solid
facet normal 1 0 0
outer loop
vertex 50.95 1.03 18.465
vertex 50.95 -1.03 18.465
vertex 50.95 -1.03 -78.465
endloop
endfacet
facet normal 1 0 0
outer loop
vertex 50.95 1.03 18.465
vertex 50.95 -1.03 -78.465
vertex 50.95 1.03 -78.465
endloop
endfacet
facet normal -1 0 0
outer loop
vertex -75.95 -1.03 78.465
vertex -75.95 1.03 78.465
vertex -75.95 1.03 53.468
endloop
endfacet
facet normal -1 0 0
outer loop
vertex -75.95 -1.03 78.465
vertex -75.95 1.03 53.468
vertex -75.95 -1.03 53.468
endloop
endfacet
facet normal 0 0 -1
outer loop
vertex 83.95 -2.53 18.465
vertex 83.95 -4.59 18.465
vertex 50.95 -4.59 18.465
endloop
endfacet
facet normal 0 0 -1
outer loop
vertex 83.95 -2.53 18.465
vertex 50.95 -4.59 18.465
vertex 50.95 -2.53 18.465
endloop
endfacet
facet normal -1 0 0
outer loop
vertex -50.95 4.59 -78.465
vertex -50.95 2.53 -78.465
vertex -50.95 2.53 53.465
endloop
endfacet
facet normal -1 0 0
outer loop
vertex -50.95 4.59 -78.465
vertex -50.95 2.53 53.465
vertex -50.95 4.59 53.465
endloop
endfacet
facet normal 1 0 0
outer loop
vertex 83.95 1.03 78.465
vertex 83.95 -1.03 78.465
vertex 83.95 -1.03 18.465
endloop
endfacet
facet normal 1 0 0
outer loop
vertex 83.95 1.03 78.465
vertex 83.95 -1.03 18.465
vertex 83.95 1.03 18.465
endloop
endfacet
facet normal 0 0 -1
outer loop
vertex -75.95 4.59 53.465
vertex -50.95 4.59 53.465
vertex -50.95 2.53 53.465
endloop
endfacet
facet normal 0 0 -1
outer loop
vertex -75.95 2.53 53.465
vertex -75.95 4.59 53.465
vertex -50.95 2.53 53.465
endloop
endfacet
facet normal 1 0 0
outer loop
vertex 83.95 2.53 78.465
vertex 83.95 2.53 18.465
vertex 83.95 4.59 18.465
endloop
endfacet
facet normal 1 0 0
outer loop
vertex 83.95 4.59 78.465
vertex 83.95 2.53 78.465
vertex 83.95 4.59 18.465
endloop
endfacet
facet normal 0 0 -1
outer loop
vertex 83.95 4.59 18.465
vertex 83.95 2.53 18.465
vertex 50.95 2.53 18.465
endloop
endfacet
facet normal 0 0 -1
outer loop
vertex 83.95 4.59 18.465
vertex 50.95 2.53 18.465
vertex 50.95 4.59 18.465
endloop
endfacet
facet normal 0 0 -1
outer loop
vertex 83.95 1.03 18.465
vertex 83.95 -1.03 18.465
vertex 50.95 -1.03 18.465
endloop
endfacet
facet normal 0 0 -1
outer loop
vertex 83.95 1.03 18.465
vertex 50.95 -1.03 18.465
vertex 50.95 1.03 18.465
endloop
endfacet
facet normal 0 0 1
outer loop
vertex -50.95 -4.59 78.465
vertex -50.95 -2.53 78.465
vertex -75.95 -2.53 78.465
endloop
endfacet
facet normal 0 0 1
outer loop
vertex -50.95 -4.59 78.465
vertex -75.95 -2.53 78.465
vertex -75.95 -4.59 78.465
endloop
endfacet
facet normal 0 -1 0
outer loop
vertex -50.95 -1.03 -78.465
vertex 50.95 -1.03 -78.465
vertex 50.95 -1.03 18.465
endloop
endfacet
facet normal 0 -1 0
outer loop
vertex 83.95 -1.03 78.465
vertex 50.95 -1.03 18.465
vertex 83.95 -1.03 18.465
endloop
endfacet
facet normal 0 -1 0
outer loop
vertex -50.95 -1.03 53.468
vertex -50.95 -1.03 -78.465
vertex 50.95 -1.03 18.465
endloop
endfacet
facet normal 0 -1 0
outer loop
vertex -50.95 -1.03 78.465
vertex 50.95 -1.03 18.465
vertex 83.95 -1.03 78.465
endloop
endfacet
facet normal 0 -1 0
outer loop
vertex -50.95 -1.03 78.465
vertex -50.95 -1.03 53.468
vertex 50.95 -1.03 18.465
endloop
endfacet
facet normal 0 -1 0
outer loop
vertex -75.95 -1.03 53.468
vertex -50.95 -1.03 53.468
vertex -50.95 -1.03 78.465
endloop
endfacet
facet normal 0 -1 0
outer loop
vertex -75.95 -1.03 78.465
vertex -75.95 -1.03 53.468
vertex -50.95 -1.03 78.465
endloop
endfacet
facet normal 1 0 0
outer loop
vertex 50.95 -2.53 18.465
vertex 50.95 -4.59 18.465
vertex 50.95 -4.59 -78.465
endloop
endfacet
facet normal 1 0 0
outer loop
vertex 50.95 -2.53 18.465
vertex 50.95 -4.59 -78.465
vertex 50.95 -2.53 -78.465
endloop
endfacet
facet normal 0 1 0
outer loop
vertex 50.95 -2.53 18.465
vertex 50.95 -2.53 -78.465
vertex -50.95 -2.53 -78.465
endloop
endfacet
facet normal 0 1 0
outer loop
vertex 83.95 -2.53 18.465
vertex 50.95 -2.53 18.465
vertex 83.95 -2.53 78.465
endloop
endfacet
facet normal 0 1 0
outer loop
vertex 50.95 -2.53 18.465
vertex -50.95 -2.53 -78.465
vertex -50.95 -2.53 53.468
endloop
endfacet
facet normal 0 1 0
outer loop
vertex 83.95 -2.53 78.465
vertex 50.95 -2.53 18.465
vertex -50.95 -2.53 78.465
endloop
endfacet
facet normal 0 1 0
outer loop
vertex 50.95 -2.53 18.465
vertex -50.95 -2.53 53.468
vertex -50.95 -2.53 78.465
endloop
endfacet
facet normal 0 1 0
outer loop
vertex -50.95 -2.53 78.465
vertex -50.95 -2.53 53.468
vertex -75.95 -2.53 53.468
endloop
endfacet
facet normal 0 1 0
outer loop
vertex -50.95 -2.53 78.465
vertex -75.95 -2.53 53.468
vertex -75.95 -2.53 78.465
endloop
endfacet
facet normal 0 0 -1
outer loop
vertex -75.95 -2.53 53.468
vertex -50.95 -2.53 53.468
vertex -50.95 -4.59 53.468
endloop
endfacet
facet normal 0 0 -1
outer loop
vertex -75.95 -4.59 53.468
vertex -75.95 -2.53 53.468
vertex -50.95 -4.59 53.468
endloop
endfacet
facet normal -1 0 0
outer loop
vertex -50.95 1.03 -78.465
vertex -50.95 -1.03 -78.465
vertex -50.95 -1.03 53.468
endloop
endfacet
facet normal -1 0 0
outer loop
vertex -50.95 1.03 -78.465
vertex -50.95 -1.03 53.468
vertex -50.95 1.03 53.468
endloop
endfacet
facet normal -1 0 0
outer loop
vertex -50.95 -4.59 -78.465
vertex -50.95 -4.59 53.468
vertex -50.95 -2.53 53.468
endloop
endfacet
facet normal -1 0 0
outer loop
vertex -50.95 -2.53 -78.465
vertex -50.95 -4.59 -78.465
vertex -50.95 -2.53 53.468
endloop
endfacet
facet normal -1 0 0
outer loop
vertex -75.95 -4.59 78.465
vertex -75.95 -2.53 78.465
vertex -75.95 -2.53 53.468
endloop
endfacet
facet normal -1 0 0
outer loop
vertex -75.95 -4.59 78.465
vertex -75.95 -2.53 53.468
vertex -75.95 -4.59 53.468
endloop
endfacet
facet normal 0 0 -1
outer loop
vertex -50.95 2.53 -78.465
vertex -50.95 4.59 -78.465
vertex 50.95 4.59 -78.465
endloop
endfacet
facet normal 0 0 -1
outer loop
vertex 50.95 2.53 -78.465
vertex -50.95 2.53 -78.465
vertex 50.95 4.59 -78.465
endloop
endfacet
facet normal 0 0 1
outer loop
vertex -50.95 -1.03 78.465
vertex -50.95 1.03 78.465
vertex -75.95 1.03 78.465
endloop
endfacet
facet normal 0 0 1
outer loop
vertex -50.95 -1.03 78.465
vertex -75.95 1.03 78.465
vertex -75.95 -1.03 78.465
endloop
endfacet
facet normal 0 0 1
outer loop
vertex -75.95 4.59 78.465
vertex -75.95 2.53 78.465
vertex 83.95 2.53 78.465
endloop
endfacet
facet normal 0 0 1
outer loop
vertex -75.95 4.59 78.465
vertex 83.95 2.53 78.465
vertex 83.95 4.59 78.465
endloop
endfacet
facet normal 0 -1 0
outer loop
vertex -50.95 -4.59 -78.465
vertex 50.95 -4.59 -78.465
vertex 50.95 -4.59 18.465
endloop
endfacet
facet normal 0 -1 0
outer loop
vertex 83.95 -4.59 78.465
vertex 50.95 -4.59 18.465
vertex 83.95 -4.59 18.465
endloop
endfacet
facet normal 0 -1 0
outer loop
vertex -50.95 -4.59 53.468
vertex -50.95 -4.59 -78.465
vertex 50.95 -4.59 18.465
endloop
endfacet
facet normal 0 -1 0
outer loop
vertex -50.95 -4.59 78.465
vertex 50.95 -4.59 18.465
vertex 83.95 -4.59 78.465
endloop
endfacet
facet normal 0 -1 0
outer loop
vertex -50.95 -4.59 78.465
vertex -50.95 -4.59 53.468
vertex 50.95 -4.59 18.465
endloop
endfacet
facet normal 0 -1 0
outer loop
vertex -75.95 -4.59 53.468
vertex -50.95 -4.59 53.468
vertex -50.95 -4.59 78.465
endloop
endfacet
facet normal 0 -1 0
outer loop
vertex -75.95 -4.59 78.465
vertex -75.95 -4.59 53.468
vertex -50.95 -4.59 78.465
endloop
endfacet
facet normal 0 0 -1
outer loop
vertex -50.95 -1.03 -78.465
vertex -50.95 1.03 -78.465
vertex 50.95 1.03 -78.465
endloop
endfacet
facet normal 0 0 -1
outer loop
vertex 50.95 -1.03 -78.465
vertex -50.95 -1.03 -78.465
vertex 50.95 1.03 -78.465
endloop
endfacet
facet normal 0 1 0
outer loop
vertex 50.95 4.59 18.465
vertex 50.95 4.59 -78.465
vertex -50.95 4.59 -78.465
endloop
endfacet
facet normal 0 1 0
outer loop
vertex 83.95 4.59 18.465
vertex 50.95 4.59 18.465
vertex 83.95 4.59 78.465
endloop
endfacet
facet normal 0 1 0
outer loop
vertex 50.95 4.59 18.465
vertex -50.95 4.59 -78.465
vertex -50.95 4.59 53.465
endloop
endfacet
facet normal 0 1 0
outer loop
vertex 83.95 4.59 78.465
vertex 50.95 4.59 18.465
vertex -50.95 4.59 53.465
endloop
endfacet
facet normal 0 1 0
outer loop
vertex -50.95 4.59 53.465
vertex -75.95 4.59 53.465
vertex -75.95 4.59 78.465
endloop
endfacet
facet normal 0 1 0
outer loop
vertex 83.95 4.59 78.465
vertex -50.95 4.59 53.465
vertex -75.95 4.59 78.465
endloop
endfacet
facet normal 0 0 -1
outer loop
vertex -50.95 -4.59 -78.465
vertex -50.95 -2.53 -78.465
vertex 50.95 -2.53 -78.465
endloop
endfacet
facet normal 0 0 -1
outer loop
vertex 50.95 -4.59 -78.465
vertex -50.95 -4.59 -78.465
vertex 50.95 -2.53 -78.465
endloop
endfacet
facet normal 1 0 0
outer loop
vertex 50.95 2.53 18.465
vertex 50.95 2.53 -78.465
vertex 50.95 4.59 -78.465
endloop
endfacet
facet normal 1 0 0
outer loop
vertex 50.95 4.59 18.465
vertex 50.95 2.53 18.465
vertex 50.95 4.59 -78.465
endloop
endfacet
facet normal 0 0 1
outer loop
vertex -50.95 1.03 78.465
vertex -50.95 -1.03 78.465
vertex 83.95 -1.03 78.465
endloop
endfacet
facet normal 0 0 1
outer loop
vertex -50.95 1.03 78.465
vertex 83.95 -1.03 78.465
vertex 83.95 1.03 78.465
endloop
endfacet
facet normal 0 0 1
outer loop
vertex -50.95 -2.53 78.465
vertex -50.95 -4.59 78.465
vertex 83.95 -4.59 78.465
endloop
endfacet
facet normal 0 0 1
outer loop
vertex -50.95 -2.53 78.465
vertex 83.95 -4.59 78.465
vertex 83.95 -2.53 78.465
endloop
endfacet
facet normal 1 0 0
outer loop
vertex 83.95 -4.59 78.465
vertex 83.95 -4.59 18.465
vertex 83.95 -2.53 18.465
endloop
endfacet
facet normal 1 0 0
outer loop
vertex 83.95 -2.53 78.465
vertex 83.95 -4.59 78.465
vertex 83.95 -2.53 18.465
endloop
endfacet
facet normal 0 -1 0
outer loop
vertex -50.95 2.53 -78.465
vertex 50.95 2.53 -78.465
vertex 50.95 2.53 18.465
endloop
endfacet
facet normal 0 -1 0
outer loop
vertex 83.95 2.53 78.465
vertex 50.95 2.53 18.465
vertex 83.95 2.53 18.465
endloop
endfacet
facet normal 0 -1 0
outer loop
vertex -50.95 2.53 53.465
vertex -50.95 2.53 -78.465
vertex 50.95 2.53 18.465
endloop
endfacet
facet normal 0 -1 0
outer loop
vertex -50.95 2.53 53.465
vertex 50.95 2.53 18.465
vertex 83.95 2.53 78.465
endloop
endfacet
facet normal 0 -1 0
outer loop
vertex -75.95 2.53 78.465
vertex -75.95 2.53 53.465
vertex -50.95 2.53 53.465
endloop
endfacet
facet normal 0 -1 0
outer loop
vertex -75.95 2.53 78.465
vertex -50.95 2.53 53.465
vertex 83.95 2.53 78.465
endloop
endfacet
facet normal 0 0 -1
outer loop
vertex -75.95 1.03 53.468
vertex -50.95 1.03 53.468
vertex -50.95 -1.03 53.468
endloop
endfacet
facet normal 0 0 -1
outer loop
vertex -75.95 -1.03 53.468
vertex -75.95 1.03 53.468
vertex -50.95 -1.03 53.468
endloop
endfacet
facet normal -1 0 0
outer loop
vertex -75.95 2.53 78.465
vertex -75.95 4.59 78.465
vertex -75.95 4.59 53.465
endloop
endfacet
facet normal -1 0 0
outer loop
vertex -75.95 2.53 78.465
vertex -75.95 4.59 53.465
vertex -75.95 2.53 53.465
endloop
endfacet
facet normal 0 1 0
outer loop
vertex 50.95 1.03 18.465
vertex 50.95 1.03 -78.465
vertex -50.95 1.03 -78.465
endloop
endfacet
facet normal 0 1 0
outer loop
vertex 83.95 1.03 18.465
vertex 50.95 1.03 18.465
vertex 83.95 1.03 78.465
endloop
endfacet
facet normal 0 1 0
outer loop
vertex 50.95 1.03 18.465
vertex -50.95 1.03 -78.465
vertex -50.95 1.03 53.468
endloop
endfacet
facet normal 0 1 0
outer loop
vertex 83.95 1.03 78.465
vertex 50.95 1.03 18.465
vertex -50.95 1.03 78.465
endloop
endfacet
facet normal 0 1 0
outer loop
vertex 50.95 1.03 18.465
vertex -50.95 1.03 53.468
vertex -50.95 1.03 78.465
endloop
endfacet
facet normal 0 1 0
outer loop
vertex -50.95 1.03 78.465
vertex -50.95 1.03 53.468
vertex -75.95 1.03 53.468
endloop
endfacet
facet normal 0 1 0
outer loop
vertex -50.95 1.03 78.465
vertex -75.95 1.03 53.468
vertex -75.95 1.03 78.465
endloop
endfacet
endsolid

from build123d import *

# Parameters (mm, degrees)
F0_W     = 101.9
F0_H     = 2.06
F1_DEPTH = 78.465
F2_W     = 2.06
F2_H     = 25
F3_W     = 2.06
F3_H     = 24.996869
F4_W     = 2.06
F4_H     = 24.996869
F5_DEPTH = 25
F6_W     = 2.06
F6_H     = 60
F7_W     = 2.06
F7_H     = 60
F8_W     = 2.06
F8_H     = 60
F9_DEPTH = 33


with BuildPart() as f1:
    # F0 (on Top) → F1 (new body, symmetric)
    with BuildSketch(Plane.XY):
        Rectangle(F0_W, F0_H)
        with Locations((0, 3.56)):
            Rectangle(F0_W, F0_H)
        with Locations((0, -3.56)):
            Rectangle(F0_W, F0_H)
    extrude(amount=F1_DEPTH, both=True)

    # F2 (on face) + F3 (on face) + F4 (on face) → F5 (join)
    with BuildSketch(Plane(origin=(-50.95, 0, 0), x_dir=(0, -1, 0), z_dir=(-1, 0, 0))):
        with Locations((-3.56, 65.965)):
            Rectangle(F2_W, F2_H)
    with BuildSketch(Plane(origin=(-50.95, 0, 0), x_dir=(0, -1, 0), z_dir=(-1, 0, 0))):
        with Locations((0, 65.966566)):
            Rectangle(F3_W, F3_H)
    with BuildSketch(Plane(origin=(-50.95, 0, 0), x_dir=(0, -1, 0), z_dir=(-1, 0, 0))):
        with Locations((3.56, 65.966566)):
            Rectangle(F4_W, F4_H)
    extrude(amount=F5_DEPTH)

    # F6 (on face) + F7 (on face) + F8 (on face) → F9 (join)
    with BuildSketch(Plane.YZ.offset(50.95)):
        with Locations((-3.56, 48.465)):
            Rectangle(F6_W, F6_H)
    with BuildSketch(Plane.YZ.offset(50.95)):
        with Locations((0, 48.465)):
            Rectangle(F7_W, F7_H)
    with BuildSketch(Plane.YZ.offset(50.95)):
        with Locations((3.56, 48.465)):
            Rectangle(F8_W, F8_H)
    extrude(amount=F9_DEPTH)


solid = f1.part
